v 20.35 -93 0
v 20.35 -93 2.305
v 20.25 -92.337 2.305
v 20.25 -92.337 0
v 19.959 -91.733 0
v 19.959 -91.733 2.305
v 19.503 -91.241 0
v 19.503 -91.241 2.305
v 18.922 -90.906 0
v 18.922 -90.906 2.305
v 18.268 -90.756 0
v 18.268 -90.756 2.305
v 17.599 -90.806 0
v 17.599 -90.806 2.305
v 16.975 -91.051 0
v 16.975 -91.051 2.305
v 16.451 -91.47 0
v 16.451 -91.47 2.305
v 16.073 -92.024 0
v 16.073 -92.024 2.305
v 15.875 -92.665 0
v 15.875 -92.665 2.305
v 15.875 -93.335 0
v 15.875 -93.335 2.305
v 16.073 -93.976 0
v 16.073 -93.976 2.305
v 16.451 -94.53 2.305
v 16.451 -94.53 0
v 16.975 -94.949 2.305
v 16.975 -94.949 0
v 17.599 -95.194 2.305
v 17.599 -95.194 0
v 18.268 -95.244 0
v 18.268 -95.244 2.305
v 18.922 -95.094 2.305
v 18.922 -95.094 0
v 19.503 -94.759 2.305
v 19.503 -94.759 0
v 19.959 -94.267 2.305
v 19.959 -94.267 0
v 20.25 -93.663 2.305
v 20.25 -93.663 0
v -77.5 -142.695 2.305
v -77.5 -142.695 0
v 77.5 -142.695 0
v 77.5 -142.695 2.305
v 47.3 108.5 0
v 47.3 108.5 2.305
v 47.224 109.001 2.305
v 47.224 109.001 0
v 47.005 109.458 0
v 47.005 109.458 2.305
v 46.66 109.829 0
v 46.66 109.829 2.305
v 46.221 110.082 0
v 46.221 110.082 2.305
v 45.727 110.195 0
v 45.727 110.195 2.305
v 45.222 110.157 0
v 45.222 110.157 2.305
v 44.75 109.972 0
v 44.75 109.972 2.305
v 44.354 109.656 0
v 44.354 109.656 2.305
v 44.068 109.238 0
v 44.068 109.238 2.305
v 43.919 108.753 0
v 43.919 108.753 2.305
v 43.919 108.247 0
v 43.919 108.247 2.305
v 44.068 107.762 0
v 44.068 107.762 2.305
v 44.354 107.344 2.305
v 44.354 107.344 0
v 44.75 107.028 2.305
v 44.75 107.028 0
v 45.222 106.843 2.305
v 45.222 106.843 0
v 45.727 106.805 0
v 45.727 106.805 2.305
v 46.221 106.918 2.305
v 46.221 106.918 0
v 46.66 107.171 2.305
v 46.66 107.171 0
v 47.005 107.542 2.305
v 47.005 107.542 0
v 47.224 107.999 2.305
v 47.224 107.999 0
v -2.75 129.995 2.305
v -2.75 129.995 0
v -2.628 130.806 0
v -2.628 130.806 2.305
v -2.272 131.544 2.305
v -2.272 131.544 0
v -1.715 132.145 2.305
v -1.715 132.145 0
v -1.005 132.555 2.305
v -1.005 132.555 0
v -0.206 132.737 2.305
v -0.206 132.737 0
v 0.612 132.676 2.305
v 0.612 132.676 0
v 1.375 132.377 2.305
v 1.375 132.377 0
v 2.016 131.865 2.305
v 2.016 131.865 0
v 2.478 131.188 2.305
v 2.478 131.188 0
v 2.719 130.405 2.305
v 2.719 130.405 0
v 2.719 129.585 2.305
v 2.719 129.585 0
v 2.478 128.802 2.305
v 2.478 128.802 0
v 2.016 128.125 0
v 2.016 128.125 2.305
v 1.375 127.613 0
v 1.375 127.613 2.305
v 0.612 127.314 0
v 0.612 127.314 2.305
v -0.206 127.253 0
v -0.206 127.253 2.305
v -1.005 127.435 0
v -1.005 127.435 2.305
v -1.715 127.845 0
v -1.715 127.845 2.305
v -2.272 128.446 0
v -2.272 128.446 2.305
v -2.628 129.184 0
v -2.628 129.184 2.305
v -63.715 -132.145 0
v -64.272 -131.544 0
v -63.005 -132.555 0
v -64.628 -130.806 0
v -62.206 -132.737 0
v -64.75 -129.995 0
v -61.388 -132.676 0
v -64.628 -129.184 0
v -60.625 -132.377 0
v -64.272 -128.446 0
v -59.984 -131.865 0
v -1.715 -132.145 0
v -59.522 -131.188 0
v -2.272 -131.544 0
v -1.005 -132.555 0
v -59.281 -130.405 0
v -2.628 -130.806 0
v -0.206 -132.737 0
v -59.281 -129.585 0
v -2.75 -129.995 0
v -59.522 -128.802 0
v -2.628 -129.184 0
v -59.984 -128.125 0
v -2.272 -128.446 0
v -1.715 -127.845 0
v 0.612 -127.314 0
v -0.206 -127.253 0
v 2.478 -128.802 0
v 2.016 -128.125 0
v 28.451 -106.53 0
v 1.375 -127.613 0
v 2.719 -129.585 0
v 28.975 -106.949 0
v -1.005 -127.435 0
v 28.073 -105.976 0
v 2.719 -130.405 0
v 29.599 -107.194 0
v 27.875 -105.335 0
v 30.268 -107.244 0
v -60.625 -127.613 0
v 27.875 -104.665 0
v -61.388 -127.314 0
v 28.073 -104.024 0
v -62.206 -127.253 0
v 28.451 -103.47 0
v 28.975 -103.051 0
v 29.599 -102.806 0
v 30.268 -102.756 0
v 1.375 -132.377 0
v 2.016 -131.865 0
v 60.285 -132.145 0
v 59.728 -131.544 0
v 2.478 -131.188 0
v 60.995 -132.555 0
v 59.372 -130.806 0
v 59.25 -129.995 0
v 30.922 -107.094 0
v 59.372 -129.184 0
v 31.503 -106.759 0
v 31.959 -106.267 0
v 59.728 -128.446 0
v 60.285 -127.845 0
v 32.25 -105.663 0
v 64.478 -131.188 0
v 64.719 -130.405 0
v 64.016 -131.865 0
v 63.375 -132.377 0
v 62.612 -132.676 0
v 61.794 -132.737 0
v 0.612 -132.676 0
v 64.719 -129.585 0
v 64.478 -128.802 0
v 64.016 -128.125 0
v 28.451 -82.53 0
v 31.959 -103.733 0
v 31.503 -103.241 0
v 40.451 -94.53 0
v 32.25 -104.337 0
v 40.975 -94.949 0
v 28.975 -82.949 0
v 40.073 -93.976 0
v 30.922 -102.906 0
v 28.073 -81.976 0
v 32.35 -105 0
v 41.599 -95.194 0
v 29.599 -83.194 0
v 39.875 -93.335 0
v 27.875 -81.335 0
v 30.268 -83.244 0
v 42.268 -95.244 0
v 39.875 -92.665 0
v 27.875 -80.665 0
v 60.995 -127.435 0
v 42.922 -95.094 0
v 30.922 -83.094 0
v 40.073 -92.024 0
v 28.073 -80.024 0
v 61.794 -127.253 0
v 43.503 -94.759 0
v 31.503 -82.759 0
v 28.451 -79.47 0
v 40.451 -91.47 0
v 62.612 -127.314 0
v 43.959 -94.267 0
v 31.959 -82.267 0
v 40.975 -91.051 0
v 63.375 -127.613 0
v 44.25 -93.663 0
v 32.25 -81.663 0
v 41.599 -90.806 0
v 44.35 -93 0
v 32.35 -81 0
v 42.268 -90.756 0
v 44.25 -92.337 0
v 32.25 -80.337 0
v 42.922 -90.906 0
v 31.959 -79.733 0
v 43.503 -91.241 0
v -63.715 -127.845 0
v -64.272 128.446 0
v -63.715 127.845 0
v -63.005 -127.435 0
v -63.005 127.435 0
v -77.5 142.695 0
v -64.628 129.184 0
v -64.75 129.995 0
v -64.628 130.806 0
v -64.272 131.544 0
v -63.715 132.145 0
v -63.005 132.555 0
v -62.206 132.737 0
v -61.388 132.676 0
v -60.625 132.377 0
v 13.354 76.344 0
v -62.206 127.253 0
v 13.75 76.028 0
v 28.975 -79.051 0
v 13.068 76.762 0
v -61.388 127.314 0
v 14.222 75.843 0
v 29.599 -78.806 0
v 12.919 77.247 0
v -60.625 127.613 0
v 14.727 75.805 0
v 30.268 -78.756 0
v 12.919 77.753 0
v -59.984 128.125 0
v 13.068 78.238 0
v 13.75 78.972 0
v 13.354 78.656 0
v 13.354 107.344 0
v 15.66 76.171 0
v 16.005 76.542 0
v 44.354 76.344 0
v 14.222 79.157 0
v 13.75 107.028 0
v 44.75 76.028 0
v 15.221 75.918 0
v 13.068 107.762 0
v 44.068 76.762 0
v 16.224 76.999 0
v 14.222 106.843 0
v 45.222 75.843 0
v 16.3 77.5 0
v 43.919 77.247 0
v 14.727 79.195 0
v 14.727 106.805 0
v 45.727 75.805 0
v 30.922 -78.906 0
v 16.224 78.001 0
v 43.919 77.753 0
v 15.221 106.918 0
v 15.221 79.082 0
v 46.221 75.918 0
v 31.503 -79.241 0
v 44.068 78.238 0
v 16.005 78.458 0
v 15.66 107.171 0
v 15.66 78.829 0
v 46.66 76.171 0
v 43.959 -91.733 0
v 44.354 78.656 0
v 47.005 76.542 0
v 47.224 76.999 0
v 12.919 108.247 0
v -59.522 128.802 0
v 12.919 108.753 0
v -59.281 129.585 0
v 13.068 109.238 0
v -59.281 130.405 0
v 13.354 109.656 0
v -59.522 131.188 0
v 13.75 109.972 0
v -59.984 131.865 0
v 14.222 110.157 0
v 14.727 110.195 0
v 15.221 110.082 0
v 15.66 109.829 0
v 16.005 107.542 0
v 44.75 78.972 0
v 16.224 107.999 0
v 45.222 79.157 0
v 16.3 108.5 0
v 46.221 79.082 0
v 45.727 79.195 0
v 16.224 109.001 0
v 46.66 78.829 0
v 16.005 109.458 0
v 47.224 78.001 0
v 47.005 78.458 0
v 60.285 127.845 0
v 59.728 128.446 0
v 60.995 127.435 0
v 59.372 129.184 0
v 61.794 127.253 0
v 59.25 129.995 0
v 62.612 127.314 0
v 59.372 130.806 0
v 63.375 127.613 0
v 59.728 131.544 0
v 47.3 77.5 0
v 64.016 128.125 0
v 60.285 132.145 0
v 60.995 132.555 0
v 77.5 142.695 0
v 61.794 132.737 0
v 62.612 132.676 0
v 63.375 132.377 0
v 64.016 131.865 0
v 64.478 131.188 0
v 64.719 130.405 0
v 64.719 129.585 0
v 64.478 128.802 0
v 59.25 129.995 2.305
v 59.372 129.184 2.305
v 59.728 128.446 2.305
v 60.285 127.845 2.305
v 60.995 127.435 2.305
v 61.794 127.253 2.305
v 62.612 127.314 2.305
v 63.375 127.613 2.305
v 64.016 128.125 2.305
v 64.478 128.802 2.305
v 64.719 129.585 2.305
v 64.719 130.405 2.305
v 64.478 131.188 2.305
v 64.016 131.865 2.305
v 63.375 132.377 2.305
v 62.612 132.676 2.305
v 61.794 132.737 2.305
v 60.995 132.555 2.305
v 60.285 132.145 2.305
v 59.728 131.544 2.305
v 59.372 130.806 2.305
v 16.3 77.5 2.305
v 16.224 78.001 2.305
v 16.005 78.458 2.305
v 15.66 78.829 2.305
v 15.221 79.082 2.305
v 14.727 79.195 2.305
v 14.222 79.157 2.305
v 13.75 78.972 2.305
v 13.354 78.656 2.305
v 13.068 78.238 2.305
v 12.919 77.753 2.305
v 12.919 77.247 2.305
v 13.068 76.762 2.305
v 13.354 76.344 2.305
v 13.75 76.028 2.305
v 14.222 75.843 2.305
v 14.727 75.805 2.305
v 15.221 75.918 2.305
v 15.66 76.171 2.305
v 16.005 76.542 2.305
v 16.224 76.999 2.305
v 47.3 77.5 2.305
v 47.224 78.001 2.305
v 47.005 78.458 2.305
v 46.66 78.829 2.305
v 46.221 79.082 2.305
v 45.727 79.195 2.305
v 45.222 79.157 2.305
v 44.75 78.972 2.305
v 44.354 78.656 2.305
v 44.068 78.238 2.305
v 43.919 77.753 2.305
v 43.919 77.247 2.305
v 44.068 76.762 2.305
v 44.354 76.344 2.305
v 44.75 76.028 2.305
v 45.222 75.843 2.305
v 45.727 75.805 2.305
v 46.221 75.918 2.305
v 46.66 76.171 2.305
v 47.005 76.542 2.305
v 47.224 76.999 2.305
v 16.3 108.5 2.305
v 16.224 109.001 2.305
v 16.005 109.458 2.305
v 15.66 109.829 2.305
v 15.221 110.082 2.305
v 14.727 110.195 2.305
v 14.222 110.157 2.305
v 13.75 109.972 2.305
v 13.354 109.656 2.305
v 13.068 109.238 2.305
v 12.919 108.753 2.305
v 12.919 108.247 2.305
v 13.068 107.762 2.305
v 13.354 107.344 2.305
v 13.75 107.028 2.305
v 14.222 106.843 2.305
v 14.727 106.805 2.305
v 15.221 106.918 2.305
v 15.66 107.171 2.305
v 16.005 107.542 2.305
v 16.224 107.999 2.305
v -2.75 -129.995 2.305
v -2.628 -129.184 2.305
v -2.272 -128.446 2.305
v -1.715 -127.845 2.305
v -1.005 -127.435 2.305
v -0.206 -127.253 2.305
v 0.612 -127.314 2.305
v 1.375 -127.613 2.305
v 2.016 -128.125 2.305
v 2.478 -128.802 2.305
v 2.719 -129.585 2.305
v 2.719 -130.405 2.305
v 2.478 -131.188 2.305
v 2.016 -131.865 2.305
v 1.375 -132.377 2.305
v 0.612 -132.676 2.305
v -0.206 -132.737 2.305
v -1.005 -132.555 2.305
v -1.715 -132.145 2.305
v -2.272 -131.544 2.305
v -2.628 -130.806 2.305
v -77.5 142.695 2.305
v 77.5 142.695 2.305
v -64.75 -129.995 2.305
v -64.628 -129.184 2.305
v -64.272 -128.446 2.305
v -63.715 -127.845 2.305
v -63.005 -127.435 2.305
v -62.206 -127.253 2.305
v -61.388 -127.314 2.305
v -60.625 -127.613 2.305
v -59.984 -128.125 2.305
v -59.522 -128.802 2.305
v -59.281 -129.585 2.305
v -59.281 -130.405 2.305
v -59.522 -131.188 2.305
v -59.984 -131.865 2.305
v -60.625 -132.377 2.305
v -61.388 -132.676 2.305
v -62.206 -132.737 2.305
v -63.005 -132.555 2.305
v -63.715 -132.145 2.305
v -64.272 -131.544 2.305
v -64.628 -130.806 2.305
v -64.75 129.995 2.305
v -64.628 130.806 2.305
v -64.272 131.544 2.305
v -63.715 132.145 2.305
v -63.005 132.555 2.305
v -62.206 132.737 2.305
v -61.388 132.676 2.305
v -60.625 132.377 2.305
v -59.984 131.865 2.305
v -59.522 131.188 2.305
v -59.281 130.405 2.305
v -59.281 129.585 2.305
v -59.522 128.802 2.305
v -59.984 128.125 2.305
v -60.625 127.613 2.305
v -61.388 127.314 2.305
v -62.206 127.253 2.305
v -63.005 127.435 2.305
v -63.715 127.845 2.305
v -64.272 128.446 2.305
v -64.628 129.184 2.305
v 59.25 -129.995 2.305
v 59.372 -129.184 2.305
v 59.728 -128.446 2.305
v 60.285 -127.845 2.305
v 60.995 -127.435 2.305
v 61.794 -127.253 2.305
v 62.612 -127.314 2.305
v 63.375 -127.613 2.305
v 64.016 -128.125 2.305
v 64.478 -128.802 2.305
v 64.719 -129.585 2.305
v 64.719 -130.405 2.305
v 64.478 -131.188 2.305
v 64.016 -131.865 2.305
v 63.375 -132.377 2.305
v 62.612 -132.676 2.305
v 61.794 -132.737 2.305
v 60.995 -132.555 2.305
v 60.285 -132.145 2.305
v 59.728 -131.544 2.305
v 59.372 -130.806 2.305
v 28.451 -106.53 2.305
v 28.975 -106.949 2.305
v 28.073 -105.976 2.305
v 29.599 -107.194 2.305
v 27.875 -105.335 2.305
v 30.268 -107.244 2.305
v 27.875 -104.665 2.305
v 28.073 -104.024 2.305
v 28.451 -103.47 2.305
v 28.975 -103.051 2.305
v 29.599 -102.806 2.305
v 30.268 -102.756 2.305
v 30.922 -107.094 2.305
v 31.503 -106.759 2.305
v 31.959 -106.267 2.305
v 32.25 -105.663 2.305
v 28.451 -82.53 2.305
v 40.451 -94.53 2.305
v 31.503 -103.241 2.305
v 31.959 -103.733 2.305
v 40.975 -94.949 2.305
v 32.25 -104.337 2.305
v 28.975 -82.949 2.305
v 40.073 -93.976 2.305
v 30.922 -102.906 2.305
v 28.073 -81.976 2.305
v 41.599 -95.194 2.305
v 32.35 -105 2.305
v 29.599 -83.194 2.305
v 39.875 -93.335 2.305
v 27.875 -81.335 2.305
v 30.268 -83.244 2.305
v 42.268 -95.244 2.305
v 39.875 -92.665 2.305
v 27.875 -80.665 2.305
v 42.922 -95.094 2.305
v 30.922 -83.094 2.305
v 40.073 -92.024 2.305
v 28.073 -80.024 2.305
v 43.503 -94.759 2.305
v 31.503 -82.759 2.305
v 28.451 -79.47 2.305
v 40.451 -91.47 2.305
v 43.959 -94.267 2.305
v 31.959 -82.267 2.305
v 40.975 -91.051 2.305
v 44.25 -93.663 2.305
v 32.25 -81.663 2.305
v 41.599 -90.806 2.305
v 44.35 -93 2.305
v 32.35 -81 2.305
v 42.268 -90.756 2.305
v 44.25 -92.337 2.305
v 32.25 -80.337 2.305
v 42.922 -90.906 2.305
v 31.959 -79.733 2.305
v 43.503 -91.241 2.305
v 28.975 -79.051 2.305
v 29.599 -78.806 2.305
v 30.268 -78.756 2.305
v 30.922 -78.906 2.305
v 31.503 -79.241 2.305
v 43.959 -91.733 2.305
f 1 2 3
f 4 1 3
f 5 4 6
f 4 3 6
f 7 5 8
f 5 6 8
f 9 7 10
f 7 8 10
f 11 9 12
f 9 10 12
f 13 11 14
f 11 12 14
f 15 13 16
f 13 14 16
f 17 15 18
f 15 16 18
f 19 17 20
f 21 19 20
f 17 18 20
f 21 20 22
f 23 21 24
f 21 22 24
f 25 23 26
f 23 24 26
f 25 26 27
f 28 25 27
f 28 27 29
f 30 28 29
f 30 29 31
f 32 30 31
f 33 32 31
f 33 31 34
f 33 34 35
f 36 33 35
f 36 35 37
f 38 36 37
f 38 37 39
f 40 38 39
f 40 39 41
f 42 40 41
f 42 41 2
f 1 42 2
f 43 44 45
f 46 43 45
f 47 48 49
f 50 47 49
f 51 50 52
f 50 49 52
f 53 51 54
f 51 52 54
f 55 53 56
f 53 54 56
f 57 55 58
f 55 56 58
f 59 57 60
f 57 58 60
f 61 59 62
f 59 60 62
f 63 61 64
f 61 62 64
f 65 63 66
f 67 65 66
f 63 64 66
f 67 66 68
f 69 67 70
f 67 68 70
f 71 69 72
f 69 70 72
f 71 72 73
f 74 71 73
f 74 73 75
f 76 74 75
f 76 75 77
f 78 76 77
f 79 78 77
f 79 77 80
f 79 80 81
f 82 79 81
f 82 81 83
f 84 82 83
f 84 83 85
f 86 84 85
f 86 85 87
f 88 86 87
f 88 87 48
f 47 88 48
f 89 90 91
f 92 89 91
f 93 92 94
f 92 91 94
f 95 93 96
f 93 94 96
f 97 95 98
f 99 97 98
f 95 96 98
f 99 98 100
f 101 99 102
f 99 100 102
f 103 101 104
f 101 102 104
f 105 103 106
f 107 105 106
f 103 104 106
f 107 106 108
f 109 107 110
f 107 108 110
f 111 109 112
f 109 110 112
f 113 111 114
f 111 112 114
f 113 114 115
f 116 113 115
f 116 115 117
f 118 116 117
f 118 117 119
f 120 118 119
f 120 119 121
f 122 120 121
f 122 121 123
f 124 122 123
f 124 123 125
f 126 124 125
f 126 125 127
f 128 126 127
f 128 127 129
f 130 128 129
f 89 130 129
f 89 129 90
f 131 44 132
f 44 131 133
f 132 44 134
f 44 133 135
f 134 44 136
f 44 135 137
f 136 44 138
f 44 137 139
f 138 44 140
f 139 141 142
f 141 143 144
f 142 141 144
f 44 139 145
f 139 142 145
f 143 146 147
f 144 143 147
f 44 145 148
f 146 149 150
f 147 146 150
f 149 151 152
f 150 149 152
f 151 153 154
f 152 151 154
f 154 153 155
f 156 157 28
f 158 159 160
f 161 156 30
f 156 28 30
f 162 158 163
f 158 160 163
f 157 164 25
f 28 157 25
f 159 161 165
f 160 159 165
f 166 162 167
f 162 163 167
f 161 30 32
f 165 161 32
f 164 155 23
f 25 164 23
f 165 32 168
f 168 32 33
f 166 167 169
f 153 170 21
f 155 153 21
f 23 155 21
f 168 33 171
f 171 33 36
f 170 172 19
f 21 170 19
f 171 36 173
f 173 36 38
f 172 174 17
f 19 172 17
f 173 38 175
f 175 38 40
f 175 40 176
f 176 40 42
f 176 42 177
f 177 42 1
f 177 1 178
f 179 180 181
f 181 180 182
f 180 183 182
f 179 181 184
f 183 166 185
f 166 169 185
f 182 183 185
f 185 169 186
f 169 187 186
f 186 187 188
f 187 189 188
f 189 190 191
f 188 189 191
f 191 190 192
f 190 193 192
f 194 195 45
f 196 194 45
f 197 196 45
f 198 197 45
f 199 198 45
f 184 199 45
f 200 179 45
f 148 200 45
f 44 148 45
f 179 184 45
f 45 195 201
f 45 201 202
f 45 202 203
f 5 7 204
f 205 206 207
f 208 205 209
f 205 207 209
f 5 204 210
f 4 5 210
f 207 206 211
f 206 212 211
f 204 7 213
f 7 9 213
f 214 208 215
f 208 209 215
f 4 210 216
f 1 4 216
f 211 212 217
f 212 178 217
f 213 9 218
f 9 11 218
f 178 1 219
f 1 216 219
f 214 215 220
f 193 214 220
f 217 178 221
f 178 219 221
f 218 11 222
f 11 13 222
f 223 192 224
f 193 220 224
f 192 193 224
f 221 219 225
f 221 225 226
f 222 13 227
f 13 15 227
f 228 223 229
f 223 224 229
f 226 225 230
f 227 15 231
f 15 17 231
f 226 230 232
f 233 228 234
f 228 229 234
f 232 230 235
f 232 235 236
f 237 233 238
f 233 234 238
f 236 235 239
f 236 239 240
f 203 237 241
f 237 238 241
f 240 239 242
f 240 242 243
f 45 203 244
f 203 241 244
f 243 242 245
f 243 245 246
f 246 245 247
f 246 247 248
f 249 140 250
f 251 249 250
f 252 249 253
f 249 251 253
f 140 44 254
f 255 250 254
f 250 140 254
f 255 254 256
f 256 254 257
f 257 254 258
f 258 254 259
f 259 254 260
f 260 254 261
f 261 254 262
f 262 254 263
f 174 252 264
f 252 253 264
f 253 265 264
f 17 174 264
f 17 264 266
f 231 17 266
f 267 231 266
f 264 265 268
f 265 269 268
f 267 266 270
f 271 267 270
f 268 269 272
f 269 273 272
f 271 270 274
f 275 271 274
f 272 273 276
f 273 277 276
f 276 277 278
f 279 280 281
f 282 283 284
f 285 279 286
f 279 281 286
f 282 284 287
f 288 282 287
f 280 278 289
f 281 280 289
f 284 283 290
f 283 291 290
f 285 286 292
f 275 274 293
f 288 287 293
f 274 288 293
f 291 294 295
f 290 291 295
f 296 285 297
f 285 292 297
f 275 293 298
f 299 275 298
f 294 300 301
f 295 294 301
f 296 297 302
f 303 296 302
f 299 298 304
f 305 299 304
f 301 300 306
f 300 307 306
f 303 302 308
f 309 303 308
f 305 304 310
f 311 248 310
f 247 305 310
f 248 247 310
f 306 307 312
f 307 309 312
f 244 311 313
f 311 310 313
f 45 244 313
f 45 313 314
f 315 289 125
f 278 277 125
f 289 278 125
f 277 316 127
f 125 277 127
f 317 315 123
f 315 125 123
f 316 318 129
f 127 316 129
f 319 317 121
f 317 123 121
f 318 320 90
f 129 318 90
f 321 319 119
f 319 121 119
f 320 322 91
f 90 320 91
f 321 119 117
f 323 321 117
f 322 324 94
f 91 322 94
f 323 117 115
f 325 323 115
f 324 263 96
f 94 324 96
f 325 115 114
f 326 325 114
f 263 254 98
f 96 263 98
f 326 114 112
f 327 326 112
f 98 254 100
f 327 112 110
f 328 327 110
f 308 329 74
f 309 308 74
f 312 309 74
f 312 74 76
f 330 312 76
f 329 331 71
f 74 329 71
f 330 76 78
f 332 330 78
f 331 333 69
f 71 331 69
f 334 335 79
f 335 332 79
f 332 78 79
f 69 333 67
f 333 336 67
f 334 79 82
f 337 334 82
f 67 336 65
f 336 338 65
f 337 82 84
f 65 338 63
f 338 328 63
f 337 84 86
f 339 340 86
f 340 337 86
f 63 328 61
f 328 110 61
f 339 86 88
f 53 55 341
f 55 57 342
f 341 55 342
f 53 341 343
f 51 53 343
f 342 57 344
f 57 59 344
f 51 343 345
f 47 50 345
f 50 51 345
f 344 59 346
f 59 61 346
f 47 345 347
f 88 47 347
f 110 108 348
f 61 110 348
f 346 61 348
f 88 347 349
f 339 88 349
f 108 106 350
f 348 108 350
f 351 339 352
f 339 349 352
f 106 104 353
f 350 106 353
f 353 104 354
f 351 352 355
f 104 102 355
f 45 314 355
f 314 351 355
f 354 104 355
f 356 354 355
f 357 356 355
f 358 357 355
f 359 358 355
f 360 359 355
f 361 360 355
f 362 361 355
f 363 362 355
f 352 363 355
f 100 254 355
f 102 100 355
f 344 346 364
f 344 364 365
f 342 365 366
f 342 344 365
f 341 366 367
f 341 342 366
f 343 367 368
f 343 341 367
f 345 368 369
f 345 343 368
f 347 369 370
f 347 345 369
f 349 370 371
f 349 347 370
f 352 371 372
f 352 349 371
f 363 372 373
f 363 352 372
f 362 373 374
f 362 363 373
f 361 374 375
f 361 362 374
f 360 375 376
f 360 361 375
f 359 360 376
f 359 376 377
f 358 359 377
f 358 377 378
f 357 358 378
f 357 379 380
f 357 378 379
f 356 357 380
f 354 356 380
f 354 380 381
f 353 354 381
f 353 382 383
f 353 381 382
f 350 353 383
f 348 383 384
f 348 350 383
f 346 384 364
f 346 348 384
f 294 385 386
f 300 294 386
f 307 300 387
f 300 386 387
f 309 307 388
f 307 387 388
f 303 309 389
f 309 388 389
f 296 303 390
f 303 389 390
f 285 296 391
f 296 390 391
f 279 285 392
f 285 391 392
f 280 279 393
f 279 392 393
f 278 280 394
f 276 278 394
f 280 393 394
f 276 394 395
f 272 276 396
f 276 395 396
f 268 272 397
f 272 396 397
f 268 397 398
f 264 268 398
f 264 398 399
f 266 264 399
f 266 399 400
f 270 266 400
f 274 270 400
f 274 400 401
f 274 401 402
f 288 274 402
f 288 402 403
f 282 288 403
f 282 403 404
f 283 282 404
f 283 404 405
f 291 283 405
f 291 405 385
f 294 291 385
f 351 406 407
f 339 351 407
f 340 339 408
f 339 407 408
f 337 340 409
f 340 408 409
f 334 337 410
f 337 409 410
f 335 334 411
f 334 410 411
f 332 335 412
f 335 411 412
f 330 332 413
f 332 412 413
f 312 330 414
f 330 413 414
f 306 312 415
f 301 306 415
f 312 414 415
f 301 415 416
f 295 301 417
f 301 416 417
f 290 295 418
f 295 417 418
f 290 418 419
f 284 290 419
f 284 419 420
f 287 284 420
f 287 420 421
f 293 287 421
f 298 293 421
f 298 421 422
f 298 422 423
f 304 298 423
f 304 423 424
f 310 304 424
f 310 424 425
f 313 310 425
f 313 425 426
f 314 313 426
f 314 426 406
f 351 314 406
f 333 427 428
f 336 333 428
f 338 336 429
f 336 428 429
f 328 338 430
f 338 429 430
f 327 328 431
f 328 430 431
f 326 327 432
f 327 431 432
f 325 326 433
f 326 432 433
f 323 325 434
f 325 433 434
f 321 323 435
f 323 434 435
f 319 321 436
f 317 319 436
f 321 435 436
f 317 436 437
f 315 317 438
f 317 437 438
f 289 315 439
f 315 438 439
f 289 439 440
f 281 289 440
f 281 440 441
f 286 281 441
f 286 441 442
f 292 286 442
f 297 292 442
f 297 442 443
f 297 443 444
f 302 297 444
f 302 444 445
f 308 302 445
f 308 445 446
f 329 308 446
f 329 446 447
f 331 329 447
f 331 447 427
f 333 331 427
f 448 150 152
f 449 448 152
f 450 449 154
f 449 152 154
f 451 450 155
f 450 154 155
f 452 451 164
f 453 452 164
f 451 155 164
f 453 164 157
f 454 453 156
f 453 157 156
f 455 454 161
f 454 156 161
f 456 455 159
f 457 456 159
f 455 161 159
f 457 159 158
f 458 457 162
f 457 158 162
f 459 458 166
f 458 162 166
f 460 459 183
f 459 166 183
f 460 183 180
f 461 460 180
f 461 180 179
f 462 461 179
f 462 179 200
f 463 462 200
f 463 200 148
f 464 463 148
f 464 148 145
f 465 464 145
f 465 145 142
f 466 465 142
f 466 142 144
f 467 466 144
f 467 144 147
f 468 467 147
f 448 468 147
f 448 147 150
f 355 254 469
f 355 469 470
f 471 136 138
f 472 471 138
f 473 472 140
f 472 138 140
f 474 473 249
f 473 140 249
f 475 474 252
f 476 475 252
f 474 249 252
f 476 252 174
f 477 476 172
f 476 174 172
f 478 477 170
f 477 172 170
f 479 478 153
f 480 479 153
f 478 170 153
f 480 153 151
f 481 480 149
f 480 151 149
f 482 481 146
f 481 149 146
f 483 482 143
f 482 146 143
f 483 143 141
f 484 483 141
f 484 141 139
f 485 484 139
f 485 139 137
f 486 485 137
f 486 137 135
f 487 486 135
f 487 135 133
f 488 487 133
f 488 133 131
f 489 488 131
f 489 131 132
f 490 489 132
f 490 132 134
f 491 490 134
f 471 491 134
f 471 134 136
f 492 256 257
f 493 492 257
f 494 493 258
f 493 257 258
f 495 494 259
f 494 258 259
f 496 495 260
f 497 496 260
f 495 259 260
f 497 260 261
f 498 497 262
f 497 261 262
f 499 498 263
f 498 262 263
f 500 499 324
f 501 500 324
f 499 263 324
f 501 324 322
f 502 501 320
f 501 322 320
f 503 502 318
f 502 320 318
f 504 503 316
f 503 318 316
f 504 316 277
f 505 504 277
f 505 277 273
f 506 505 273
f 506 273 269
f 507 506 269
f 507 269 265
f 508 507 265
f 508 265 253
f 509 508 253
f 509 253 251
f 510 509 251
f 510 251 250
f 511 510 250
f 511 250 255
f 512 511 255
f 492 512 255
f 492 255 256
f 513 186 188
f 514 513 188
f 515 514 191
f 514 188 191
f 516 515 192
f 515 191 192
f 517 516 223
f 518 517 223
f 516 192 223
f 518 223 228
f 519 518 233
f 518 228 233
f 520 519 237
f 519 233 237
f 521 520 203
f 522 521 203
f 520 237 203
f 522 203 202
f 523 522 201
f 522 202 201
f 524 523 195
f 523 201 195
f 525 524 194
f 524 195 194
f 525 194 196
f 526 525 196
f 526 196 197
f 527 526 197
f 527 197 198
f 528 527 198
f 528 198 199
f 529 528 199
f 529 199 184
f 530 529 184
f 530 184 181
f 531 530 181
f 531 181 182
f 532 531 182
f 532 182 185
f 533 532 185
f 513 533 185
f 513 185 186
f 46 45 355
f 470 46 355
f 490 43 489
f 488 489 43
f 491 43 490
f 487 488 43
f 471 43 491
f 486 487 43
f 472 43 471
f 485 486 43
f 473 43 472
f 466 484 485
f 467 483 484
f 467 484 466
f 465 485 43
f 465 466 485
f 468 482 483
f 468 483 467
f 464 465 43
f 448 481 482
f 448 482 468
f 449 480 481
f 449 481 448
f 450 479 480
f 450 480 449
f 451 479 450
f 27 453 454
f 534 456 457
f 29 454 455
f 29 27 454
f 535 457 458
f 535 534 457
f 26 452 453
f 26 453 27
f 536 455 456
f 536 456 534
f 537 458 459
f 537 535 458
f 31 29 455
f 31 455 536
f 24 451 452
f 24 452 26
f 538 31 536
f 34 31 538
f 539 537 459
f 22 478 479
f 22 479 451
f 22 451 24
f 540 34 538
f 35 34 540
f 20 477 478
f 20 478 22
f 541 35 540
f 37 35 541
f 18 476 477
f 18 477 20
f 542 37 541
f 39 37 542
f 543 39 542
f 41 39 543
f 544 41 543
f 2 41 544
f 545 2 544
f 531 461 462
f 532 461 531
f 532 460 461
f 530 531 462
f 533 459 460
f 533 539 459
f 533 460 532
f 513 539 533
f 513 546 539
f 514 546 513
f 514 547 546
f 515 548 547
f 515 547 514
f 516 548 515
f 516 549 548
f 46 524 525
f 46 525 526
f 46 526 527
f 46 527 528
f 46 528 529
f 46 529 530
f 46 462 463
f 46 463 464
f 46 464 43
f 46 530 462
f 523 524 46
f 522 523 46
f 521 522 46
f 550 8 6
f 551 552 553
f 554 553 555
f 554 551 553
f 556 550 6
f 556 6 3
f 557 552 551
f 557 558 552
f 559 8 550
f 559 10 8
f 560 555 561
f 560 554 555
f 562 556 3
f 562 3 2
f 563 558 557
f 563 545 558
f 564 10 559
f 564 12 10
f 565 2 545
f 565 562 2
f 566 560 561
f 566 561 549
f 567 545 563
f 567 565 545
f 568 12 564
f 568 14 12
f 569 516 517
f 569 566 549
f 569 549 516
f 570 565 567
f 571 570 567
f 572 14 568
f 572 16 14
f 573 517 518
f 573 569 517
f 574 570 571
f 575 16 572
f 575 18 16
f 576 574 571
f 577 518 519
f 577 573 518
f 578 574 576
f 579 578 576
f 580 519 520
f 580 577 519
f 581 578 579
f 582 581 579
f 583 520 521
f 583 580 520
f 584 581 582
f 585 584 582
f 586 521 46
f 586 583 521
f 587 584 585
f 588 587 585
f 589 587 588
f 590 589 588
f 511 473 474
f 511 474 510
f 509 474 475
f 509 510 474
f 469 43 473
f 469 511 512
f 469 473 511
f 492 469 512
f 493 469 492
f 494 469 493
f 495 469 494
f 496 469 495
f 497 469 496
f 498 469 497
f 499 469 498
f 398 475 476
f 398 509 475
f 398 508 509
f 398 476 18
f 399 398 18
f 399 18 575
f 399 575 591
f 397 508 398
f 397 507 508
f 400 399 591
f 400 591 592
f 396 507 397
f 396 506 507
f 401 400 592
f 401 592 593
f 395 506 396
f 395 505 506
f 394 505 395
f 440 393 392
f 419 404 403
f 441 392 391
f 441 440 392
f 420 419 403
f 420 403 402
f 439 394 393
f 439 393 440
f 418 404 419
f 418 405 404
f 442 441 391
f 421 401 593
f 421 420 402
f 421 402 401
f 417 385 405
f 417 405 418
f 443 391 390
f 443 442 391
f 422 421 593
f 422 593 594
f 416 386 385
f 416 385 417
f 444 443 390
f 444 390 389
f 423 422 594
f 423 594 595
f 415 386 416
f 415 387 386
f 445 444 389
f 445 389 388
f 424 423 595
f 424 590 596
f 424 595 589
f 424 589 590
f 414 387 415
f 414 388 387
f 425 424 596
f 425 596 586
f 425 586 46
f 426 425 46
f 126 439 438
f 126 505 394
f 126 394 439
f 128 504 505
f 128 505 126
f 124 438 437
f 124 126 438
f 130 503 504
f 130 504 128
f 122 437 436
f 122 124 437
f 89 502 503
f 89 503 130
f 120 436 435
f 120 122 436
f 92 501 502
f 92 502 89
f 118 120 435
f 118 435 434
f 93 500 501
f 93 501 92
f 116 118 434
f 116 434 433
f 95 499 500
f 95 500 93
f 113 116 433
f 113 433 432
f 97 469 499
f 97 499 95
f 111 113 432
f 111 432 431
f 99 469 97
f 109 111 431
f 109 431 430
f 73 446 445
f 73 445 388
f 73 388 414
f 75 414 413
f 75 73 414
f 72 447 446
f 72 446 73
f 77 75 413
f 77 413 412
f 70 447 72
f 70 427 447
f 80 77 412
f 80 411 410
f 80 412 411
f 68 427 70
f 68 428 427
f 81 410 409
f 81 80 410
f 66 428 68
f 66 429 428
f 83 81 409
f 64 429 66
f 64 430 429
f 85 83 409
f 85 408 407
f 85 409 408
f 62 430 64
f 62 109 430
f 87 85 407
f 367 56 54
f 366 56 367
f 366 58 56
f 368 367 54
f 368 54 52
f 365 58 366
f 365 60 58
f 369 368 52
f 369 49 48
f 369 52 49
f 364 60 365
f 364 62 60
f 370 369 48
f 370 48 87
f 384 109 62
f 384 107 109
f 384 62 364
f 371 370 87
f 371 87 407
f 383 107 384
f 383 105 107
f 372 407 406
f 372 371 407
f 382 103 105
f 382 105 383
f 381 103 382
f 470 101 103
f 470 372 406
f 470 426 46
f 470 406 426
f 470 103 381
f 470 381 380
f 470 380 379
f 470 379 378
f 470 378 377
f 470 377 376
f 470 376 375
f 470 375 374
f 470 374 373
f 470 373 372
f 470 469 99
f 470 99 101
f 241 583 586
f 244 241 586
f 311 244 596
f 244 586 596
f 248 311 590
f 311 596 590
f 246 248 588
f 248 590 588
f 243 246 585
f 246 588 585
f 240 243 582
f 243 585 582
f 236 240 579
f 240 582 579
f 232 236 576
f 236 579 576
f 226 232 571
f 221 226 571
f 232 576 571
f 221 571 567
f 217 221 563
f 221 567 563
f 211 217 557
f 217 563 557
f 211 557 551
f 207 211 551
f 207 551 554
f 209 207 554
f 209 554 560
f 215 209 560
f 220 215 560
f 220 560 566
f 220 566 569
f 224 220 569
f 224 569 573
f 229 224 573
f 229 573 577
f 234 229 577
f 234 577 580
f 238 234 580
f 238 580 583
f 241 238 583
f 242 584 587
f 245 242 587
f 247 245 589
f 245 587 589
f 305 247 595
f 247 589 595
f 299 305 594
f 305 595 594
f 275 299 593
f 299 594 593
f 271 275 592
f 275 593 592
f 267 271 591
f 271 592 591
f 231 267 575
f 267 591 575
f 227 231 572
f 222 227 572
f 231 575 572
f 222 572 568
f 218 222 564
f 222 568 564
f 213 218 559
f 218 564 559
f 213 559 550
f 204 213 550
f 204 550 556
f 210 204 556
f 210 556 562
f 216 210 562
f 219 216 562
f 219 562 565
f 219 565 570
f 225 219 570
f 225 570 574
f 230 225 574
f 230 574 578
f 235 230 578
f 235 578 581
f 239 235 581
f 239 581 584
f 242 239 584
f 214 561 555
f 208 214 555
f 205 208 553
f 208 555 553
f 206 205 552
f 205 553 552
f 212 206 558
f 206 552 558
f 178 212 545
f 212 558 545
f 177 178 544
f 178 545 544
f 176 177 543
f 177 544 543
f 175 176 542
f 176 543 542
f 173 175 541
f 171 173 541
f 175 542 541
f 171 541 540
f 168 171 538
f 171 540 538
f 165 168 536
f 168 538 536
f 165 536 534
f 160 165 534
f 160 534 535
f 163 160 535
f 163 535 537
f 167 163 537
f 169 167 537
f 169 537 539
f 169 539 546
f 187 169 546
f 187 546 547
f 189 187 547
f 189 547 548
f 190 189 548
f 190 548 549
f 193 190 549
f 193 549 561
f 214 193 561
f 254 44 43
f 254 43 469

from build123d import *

# Parameters (mm, degrees)
SKETCH1_W            = 155
SKETCH1_H            = 285.39
BOSS_EXTRUDE1_DEPTH  = 2.305
M5_CLEARANCE_HOLE1_D = 5.5
SKETCH4_R            = 2.25
SKETCH4_R_2          = 1.7
CUT_EXTRUDE1_DEPTH   = 3.305


with BuildPart() as part:
    # Sketch1 → Boss-Extrude1 (new body)
    with BuildSketch(Plane.XY):
        Rectangle(SKETCH1_W, SKETCH1_H)
    extrude(amount=BOSS_EXTRUDE1_DEPTH)

    # M5 Clearance Hole1 (through all)
    with Locations(Plane.XY.offset(2.305)):
        with Locations((-62, 129.995), (0, 129.995), (-62, -129.995), (0, -129.995), (62, -129.995)):
            m5_clearance_hole1 = Hole(M5_CLEARANCE_HOLE1_D / 2)

    # Sketch4 → Cut-Extrude1 (cut, through all)
    with BuildSketch(Plane.XY.offset(2.305)):
        with Locations((30.1, -81)):
            Circle(SKETCH4_R)
        with Locations((42.1, -93)):
            Circle(SKETCH4_R)
        with Locations((30.1, -105)):
            Circle(SKETCH4_R)
        with Locations((18.1, -93)):
            Circle(SKETCH4_R)
        with Locations((45.6, 108.5)):
            Circle(SKETCH4_R_2)
        with Locations((14.6, 77.5)):
            Circle(SKETCH4_R_2)
        with Locations((45.6, 77.5)):
            Circle(SKETCH4_R_2)
        with Locations((14.6, 108.5)):
            Circle(SKETCH4_R_2)
    extrude(amount=-CUT_EXTRUDE1_DEPTH, mode=Mode.SUBTRACT)

    # Mirror1: M5 Clearance Hole1 across plane
    add(m5_clearance_hole1.mirror(Plane.ZX), mode=Mode.SUBTRACT)


solid = part.part
